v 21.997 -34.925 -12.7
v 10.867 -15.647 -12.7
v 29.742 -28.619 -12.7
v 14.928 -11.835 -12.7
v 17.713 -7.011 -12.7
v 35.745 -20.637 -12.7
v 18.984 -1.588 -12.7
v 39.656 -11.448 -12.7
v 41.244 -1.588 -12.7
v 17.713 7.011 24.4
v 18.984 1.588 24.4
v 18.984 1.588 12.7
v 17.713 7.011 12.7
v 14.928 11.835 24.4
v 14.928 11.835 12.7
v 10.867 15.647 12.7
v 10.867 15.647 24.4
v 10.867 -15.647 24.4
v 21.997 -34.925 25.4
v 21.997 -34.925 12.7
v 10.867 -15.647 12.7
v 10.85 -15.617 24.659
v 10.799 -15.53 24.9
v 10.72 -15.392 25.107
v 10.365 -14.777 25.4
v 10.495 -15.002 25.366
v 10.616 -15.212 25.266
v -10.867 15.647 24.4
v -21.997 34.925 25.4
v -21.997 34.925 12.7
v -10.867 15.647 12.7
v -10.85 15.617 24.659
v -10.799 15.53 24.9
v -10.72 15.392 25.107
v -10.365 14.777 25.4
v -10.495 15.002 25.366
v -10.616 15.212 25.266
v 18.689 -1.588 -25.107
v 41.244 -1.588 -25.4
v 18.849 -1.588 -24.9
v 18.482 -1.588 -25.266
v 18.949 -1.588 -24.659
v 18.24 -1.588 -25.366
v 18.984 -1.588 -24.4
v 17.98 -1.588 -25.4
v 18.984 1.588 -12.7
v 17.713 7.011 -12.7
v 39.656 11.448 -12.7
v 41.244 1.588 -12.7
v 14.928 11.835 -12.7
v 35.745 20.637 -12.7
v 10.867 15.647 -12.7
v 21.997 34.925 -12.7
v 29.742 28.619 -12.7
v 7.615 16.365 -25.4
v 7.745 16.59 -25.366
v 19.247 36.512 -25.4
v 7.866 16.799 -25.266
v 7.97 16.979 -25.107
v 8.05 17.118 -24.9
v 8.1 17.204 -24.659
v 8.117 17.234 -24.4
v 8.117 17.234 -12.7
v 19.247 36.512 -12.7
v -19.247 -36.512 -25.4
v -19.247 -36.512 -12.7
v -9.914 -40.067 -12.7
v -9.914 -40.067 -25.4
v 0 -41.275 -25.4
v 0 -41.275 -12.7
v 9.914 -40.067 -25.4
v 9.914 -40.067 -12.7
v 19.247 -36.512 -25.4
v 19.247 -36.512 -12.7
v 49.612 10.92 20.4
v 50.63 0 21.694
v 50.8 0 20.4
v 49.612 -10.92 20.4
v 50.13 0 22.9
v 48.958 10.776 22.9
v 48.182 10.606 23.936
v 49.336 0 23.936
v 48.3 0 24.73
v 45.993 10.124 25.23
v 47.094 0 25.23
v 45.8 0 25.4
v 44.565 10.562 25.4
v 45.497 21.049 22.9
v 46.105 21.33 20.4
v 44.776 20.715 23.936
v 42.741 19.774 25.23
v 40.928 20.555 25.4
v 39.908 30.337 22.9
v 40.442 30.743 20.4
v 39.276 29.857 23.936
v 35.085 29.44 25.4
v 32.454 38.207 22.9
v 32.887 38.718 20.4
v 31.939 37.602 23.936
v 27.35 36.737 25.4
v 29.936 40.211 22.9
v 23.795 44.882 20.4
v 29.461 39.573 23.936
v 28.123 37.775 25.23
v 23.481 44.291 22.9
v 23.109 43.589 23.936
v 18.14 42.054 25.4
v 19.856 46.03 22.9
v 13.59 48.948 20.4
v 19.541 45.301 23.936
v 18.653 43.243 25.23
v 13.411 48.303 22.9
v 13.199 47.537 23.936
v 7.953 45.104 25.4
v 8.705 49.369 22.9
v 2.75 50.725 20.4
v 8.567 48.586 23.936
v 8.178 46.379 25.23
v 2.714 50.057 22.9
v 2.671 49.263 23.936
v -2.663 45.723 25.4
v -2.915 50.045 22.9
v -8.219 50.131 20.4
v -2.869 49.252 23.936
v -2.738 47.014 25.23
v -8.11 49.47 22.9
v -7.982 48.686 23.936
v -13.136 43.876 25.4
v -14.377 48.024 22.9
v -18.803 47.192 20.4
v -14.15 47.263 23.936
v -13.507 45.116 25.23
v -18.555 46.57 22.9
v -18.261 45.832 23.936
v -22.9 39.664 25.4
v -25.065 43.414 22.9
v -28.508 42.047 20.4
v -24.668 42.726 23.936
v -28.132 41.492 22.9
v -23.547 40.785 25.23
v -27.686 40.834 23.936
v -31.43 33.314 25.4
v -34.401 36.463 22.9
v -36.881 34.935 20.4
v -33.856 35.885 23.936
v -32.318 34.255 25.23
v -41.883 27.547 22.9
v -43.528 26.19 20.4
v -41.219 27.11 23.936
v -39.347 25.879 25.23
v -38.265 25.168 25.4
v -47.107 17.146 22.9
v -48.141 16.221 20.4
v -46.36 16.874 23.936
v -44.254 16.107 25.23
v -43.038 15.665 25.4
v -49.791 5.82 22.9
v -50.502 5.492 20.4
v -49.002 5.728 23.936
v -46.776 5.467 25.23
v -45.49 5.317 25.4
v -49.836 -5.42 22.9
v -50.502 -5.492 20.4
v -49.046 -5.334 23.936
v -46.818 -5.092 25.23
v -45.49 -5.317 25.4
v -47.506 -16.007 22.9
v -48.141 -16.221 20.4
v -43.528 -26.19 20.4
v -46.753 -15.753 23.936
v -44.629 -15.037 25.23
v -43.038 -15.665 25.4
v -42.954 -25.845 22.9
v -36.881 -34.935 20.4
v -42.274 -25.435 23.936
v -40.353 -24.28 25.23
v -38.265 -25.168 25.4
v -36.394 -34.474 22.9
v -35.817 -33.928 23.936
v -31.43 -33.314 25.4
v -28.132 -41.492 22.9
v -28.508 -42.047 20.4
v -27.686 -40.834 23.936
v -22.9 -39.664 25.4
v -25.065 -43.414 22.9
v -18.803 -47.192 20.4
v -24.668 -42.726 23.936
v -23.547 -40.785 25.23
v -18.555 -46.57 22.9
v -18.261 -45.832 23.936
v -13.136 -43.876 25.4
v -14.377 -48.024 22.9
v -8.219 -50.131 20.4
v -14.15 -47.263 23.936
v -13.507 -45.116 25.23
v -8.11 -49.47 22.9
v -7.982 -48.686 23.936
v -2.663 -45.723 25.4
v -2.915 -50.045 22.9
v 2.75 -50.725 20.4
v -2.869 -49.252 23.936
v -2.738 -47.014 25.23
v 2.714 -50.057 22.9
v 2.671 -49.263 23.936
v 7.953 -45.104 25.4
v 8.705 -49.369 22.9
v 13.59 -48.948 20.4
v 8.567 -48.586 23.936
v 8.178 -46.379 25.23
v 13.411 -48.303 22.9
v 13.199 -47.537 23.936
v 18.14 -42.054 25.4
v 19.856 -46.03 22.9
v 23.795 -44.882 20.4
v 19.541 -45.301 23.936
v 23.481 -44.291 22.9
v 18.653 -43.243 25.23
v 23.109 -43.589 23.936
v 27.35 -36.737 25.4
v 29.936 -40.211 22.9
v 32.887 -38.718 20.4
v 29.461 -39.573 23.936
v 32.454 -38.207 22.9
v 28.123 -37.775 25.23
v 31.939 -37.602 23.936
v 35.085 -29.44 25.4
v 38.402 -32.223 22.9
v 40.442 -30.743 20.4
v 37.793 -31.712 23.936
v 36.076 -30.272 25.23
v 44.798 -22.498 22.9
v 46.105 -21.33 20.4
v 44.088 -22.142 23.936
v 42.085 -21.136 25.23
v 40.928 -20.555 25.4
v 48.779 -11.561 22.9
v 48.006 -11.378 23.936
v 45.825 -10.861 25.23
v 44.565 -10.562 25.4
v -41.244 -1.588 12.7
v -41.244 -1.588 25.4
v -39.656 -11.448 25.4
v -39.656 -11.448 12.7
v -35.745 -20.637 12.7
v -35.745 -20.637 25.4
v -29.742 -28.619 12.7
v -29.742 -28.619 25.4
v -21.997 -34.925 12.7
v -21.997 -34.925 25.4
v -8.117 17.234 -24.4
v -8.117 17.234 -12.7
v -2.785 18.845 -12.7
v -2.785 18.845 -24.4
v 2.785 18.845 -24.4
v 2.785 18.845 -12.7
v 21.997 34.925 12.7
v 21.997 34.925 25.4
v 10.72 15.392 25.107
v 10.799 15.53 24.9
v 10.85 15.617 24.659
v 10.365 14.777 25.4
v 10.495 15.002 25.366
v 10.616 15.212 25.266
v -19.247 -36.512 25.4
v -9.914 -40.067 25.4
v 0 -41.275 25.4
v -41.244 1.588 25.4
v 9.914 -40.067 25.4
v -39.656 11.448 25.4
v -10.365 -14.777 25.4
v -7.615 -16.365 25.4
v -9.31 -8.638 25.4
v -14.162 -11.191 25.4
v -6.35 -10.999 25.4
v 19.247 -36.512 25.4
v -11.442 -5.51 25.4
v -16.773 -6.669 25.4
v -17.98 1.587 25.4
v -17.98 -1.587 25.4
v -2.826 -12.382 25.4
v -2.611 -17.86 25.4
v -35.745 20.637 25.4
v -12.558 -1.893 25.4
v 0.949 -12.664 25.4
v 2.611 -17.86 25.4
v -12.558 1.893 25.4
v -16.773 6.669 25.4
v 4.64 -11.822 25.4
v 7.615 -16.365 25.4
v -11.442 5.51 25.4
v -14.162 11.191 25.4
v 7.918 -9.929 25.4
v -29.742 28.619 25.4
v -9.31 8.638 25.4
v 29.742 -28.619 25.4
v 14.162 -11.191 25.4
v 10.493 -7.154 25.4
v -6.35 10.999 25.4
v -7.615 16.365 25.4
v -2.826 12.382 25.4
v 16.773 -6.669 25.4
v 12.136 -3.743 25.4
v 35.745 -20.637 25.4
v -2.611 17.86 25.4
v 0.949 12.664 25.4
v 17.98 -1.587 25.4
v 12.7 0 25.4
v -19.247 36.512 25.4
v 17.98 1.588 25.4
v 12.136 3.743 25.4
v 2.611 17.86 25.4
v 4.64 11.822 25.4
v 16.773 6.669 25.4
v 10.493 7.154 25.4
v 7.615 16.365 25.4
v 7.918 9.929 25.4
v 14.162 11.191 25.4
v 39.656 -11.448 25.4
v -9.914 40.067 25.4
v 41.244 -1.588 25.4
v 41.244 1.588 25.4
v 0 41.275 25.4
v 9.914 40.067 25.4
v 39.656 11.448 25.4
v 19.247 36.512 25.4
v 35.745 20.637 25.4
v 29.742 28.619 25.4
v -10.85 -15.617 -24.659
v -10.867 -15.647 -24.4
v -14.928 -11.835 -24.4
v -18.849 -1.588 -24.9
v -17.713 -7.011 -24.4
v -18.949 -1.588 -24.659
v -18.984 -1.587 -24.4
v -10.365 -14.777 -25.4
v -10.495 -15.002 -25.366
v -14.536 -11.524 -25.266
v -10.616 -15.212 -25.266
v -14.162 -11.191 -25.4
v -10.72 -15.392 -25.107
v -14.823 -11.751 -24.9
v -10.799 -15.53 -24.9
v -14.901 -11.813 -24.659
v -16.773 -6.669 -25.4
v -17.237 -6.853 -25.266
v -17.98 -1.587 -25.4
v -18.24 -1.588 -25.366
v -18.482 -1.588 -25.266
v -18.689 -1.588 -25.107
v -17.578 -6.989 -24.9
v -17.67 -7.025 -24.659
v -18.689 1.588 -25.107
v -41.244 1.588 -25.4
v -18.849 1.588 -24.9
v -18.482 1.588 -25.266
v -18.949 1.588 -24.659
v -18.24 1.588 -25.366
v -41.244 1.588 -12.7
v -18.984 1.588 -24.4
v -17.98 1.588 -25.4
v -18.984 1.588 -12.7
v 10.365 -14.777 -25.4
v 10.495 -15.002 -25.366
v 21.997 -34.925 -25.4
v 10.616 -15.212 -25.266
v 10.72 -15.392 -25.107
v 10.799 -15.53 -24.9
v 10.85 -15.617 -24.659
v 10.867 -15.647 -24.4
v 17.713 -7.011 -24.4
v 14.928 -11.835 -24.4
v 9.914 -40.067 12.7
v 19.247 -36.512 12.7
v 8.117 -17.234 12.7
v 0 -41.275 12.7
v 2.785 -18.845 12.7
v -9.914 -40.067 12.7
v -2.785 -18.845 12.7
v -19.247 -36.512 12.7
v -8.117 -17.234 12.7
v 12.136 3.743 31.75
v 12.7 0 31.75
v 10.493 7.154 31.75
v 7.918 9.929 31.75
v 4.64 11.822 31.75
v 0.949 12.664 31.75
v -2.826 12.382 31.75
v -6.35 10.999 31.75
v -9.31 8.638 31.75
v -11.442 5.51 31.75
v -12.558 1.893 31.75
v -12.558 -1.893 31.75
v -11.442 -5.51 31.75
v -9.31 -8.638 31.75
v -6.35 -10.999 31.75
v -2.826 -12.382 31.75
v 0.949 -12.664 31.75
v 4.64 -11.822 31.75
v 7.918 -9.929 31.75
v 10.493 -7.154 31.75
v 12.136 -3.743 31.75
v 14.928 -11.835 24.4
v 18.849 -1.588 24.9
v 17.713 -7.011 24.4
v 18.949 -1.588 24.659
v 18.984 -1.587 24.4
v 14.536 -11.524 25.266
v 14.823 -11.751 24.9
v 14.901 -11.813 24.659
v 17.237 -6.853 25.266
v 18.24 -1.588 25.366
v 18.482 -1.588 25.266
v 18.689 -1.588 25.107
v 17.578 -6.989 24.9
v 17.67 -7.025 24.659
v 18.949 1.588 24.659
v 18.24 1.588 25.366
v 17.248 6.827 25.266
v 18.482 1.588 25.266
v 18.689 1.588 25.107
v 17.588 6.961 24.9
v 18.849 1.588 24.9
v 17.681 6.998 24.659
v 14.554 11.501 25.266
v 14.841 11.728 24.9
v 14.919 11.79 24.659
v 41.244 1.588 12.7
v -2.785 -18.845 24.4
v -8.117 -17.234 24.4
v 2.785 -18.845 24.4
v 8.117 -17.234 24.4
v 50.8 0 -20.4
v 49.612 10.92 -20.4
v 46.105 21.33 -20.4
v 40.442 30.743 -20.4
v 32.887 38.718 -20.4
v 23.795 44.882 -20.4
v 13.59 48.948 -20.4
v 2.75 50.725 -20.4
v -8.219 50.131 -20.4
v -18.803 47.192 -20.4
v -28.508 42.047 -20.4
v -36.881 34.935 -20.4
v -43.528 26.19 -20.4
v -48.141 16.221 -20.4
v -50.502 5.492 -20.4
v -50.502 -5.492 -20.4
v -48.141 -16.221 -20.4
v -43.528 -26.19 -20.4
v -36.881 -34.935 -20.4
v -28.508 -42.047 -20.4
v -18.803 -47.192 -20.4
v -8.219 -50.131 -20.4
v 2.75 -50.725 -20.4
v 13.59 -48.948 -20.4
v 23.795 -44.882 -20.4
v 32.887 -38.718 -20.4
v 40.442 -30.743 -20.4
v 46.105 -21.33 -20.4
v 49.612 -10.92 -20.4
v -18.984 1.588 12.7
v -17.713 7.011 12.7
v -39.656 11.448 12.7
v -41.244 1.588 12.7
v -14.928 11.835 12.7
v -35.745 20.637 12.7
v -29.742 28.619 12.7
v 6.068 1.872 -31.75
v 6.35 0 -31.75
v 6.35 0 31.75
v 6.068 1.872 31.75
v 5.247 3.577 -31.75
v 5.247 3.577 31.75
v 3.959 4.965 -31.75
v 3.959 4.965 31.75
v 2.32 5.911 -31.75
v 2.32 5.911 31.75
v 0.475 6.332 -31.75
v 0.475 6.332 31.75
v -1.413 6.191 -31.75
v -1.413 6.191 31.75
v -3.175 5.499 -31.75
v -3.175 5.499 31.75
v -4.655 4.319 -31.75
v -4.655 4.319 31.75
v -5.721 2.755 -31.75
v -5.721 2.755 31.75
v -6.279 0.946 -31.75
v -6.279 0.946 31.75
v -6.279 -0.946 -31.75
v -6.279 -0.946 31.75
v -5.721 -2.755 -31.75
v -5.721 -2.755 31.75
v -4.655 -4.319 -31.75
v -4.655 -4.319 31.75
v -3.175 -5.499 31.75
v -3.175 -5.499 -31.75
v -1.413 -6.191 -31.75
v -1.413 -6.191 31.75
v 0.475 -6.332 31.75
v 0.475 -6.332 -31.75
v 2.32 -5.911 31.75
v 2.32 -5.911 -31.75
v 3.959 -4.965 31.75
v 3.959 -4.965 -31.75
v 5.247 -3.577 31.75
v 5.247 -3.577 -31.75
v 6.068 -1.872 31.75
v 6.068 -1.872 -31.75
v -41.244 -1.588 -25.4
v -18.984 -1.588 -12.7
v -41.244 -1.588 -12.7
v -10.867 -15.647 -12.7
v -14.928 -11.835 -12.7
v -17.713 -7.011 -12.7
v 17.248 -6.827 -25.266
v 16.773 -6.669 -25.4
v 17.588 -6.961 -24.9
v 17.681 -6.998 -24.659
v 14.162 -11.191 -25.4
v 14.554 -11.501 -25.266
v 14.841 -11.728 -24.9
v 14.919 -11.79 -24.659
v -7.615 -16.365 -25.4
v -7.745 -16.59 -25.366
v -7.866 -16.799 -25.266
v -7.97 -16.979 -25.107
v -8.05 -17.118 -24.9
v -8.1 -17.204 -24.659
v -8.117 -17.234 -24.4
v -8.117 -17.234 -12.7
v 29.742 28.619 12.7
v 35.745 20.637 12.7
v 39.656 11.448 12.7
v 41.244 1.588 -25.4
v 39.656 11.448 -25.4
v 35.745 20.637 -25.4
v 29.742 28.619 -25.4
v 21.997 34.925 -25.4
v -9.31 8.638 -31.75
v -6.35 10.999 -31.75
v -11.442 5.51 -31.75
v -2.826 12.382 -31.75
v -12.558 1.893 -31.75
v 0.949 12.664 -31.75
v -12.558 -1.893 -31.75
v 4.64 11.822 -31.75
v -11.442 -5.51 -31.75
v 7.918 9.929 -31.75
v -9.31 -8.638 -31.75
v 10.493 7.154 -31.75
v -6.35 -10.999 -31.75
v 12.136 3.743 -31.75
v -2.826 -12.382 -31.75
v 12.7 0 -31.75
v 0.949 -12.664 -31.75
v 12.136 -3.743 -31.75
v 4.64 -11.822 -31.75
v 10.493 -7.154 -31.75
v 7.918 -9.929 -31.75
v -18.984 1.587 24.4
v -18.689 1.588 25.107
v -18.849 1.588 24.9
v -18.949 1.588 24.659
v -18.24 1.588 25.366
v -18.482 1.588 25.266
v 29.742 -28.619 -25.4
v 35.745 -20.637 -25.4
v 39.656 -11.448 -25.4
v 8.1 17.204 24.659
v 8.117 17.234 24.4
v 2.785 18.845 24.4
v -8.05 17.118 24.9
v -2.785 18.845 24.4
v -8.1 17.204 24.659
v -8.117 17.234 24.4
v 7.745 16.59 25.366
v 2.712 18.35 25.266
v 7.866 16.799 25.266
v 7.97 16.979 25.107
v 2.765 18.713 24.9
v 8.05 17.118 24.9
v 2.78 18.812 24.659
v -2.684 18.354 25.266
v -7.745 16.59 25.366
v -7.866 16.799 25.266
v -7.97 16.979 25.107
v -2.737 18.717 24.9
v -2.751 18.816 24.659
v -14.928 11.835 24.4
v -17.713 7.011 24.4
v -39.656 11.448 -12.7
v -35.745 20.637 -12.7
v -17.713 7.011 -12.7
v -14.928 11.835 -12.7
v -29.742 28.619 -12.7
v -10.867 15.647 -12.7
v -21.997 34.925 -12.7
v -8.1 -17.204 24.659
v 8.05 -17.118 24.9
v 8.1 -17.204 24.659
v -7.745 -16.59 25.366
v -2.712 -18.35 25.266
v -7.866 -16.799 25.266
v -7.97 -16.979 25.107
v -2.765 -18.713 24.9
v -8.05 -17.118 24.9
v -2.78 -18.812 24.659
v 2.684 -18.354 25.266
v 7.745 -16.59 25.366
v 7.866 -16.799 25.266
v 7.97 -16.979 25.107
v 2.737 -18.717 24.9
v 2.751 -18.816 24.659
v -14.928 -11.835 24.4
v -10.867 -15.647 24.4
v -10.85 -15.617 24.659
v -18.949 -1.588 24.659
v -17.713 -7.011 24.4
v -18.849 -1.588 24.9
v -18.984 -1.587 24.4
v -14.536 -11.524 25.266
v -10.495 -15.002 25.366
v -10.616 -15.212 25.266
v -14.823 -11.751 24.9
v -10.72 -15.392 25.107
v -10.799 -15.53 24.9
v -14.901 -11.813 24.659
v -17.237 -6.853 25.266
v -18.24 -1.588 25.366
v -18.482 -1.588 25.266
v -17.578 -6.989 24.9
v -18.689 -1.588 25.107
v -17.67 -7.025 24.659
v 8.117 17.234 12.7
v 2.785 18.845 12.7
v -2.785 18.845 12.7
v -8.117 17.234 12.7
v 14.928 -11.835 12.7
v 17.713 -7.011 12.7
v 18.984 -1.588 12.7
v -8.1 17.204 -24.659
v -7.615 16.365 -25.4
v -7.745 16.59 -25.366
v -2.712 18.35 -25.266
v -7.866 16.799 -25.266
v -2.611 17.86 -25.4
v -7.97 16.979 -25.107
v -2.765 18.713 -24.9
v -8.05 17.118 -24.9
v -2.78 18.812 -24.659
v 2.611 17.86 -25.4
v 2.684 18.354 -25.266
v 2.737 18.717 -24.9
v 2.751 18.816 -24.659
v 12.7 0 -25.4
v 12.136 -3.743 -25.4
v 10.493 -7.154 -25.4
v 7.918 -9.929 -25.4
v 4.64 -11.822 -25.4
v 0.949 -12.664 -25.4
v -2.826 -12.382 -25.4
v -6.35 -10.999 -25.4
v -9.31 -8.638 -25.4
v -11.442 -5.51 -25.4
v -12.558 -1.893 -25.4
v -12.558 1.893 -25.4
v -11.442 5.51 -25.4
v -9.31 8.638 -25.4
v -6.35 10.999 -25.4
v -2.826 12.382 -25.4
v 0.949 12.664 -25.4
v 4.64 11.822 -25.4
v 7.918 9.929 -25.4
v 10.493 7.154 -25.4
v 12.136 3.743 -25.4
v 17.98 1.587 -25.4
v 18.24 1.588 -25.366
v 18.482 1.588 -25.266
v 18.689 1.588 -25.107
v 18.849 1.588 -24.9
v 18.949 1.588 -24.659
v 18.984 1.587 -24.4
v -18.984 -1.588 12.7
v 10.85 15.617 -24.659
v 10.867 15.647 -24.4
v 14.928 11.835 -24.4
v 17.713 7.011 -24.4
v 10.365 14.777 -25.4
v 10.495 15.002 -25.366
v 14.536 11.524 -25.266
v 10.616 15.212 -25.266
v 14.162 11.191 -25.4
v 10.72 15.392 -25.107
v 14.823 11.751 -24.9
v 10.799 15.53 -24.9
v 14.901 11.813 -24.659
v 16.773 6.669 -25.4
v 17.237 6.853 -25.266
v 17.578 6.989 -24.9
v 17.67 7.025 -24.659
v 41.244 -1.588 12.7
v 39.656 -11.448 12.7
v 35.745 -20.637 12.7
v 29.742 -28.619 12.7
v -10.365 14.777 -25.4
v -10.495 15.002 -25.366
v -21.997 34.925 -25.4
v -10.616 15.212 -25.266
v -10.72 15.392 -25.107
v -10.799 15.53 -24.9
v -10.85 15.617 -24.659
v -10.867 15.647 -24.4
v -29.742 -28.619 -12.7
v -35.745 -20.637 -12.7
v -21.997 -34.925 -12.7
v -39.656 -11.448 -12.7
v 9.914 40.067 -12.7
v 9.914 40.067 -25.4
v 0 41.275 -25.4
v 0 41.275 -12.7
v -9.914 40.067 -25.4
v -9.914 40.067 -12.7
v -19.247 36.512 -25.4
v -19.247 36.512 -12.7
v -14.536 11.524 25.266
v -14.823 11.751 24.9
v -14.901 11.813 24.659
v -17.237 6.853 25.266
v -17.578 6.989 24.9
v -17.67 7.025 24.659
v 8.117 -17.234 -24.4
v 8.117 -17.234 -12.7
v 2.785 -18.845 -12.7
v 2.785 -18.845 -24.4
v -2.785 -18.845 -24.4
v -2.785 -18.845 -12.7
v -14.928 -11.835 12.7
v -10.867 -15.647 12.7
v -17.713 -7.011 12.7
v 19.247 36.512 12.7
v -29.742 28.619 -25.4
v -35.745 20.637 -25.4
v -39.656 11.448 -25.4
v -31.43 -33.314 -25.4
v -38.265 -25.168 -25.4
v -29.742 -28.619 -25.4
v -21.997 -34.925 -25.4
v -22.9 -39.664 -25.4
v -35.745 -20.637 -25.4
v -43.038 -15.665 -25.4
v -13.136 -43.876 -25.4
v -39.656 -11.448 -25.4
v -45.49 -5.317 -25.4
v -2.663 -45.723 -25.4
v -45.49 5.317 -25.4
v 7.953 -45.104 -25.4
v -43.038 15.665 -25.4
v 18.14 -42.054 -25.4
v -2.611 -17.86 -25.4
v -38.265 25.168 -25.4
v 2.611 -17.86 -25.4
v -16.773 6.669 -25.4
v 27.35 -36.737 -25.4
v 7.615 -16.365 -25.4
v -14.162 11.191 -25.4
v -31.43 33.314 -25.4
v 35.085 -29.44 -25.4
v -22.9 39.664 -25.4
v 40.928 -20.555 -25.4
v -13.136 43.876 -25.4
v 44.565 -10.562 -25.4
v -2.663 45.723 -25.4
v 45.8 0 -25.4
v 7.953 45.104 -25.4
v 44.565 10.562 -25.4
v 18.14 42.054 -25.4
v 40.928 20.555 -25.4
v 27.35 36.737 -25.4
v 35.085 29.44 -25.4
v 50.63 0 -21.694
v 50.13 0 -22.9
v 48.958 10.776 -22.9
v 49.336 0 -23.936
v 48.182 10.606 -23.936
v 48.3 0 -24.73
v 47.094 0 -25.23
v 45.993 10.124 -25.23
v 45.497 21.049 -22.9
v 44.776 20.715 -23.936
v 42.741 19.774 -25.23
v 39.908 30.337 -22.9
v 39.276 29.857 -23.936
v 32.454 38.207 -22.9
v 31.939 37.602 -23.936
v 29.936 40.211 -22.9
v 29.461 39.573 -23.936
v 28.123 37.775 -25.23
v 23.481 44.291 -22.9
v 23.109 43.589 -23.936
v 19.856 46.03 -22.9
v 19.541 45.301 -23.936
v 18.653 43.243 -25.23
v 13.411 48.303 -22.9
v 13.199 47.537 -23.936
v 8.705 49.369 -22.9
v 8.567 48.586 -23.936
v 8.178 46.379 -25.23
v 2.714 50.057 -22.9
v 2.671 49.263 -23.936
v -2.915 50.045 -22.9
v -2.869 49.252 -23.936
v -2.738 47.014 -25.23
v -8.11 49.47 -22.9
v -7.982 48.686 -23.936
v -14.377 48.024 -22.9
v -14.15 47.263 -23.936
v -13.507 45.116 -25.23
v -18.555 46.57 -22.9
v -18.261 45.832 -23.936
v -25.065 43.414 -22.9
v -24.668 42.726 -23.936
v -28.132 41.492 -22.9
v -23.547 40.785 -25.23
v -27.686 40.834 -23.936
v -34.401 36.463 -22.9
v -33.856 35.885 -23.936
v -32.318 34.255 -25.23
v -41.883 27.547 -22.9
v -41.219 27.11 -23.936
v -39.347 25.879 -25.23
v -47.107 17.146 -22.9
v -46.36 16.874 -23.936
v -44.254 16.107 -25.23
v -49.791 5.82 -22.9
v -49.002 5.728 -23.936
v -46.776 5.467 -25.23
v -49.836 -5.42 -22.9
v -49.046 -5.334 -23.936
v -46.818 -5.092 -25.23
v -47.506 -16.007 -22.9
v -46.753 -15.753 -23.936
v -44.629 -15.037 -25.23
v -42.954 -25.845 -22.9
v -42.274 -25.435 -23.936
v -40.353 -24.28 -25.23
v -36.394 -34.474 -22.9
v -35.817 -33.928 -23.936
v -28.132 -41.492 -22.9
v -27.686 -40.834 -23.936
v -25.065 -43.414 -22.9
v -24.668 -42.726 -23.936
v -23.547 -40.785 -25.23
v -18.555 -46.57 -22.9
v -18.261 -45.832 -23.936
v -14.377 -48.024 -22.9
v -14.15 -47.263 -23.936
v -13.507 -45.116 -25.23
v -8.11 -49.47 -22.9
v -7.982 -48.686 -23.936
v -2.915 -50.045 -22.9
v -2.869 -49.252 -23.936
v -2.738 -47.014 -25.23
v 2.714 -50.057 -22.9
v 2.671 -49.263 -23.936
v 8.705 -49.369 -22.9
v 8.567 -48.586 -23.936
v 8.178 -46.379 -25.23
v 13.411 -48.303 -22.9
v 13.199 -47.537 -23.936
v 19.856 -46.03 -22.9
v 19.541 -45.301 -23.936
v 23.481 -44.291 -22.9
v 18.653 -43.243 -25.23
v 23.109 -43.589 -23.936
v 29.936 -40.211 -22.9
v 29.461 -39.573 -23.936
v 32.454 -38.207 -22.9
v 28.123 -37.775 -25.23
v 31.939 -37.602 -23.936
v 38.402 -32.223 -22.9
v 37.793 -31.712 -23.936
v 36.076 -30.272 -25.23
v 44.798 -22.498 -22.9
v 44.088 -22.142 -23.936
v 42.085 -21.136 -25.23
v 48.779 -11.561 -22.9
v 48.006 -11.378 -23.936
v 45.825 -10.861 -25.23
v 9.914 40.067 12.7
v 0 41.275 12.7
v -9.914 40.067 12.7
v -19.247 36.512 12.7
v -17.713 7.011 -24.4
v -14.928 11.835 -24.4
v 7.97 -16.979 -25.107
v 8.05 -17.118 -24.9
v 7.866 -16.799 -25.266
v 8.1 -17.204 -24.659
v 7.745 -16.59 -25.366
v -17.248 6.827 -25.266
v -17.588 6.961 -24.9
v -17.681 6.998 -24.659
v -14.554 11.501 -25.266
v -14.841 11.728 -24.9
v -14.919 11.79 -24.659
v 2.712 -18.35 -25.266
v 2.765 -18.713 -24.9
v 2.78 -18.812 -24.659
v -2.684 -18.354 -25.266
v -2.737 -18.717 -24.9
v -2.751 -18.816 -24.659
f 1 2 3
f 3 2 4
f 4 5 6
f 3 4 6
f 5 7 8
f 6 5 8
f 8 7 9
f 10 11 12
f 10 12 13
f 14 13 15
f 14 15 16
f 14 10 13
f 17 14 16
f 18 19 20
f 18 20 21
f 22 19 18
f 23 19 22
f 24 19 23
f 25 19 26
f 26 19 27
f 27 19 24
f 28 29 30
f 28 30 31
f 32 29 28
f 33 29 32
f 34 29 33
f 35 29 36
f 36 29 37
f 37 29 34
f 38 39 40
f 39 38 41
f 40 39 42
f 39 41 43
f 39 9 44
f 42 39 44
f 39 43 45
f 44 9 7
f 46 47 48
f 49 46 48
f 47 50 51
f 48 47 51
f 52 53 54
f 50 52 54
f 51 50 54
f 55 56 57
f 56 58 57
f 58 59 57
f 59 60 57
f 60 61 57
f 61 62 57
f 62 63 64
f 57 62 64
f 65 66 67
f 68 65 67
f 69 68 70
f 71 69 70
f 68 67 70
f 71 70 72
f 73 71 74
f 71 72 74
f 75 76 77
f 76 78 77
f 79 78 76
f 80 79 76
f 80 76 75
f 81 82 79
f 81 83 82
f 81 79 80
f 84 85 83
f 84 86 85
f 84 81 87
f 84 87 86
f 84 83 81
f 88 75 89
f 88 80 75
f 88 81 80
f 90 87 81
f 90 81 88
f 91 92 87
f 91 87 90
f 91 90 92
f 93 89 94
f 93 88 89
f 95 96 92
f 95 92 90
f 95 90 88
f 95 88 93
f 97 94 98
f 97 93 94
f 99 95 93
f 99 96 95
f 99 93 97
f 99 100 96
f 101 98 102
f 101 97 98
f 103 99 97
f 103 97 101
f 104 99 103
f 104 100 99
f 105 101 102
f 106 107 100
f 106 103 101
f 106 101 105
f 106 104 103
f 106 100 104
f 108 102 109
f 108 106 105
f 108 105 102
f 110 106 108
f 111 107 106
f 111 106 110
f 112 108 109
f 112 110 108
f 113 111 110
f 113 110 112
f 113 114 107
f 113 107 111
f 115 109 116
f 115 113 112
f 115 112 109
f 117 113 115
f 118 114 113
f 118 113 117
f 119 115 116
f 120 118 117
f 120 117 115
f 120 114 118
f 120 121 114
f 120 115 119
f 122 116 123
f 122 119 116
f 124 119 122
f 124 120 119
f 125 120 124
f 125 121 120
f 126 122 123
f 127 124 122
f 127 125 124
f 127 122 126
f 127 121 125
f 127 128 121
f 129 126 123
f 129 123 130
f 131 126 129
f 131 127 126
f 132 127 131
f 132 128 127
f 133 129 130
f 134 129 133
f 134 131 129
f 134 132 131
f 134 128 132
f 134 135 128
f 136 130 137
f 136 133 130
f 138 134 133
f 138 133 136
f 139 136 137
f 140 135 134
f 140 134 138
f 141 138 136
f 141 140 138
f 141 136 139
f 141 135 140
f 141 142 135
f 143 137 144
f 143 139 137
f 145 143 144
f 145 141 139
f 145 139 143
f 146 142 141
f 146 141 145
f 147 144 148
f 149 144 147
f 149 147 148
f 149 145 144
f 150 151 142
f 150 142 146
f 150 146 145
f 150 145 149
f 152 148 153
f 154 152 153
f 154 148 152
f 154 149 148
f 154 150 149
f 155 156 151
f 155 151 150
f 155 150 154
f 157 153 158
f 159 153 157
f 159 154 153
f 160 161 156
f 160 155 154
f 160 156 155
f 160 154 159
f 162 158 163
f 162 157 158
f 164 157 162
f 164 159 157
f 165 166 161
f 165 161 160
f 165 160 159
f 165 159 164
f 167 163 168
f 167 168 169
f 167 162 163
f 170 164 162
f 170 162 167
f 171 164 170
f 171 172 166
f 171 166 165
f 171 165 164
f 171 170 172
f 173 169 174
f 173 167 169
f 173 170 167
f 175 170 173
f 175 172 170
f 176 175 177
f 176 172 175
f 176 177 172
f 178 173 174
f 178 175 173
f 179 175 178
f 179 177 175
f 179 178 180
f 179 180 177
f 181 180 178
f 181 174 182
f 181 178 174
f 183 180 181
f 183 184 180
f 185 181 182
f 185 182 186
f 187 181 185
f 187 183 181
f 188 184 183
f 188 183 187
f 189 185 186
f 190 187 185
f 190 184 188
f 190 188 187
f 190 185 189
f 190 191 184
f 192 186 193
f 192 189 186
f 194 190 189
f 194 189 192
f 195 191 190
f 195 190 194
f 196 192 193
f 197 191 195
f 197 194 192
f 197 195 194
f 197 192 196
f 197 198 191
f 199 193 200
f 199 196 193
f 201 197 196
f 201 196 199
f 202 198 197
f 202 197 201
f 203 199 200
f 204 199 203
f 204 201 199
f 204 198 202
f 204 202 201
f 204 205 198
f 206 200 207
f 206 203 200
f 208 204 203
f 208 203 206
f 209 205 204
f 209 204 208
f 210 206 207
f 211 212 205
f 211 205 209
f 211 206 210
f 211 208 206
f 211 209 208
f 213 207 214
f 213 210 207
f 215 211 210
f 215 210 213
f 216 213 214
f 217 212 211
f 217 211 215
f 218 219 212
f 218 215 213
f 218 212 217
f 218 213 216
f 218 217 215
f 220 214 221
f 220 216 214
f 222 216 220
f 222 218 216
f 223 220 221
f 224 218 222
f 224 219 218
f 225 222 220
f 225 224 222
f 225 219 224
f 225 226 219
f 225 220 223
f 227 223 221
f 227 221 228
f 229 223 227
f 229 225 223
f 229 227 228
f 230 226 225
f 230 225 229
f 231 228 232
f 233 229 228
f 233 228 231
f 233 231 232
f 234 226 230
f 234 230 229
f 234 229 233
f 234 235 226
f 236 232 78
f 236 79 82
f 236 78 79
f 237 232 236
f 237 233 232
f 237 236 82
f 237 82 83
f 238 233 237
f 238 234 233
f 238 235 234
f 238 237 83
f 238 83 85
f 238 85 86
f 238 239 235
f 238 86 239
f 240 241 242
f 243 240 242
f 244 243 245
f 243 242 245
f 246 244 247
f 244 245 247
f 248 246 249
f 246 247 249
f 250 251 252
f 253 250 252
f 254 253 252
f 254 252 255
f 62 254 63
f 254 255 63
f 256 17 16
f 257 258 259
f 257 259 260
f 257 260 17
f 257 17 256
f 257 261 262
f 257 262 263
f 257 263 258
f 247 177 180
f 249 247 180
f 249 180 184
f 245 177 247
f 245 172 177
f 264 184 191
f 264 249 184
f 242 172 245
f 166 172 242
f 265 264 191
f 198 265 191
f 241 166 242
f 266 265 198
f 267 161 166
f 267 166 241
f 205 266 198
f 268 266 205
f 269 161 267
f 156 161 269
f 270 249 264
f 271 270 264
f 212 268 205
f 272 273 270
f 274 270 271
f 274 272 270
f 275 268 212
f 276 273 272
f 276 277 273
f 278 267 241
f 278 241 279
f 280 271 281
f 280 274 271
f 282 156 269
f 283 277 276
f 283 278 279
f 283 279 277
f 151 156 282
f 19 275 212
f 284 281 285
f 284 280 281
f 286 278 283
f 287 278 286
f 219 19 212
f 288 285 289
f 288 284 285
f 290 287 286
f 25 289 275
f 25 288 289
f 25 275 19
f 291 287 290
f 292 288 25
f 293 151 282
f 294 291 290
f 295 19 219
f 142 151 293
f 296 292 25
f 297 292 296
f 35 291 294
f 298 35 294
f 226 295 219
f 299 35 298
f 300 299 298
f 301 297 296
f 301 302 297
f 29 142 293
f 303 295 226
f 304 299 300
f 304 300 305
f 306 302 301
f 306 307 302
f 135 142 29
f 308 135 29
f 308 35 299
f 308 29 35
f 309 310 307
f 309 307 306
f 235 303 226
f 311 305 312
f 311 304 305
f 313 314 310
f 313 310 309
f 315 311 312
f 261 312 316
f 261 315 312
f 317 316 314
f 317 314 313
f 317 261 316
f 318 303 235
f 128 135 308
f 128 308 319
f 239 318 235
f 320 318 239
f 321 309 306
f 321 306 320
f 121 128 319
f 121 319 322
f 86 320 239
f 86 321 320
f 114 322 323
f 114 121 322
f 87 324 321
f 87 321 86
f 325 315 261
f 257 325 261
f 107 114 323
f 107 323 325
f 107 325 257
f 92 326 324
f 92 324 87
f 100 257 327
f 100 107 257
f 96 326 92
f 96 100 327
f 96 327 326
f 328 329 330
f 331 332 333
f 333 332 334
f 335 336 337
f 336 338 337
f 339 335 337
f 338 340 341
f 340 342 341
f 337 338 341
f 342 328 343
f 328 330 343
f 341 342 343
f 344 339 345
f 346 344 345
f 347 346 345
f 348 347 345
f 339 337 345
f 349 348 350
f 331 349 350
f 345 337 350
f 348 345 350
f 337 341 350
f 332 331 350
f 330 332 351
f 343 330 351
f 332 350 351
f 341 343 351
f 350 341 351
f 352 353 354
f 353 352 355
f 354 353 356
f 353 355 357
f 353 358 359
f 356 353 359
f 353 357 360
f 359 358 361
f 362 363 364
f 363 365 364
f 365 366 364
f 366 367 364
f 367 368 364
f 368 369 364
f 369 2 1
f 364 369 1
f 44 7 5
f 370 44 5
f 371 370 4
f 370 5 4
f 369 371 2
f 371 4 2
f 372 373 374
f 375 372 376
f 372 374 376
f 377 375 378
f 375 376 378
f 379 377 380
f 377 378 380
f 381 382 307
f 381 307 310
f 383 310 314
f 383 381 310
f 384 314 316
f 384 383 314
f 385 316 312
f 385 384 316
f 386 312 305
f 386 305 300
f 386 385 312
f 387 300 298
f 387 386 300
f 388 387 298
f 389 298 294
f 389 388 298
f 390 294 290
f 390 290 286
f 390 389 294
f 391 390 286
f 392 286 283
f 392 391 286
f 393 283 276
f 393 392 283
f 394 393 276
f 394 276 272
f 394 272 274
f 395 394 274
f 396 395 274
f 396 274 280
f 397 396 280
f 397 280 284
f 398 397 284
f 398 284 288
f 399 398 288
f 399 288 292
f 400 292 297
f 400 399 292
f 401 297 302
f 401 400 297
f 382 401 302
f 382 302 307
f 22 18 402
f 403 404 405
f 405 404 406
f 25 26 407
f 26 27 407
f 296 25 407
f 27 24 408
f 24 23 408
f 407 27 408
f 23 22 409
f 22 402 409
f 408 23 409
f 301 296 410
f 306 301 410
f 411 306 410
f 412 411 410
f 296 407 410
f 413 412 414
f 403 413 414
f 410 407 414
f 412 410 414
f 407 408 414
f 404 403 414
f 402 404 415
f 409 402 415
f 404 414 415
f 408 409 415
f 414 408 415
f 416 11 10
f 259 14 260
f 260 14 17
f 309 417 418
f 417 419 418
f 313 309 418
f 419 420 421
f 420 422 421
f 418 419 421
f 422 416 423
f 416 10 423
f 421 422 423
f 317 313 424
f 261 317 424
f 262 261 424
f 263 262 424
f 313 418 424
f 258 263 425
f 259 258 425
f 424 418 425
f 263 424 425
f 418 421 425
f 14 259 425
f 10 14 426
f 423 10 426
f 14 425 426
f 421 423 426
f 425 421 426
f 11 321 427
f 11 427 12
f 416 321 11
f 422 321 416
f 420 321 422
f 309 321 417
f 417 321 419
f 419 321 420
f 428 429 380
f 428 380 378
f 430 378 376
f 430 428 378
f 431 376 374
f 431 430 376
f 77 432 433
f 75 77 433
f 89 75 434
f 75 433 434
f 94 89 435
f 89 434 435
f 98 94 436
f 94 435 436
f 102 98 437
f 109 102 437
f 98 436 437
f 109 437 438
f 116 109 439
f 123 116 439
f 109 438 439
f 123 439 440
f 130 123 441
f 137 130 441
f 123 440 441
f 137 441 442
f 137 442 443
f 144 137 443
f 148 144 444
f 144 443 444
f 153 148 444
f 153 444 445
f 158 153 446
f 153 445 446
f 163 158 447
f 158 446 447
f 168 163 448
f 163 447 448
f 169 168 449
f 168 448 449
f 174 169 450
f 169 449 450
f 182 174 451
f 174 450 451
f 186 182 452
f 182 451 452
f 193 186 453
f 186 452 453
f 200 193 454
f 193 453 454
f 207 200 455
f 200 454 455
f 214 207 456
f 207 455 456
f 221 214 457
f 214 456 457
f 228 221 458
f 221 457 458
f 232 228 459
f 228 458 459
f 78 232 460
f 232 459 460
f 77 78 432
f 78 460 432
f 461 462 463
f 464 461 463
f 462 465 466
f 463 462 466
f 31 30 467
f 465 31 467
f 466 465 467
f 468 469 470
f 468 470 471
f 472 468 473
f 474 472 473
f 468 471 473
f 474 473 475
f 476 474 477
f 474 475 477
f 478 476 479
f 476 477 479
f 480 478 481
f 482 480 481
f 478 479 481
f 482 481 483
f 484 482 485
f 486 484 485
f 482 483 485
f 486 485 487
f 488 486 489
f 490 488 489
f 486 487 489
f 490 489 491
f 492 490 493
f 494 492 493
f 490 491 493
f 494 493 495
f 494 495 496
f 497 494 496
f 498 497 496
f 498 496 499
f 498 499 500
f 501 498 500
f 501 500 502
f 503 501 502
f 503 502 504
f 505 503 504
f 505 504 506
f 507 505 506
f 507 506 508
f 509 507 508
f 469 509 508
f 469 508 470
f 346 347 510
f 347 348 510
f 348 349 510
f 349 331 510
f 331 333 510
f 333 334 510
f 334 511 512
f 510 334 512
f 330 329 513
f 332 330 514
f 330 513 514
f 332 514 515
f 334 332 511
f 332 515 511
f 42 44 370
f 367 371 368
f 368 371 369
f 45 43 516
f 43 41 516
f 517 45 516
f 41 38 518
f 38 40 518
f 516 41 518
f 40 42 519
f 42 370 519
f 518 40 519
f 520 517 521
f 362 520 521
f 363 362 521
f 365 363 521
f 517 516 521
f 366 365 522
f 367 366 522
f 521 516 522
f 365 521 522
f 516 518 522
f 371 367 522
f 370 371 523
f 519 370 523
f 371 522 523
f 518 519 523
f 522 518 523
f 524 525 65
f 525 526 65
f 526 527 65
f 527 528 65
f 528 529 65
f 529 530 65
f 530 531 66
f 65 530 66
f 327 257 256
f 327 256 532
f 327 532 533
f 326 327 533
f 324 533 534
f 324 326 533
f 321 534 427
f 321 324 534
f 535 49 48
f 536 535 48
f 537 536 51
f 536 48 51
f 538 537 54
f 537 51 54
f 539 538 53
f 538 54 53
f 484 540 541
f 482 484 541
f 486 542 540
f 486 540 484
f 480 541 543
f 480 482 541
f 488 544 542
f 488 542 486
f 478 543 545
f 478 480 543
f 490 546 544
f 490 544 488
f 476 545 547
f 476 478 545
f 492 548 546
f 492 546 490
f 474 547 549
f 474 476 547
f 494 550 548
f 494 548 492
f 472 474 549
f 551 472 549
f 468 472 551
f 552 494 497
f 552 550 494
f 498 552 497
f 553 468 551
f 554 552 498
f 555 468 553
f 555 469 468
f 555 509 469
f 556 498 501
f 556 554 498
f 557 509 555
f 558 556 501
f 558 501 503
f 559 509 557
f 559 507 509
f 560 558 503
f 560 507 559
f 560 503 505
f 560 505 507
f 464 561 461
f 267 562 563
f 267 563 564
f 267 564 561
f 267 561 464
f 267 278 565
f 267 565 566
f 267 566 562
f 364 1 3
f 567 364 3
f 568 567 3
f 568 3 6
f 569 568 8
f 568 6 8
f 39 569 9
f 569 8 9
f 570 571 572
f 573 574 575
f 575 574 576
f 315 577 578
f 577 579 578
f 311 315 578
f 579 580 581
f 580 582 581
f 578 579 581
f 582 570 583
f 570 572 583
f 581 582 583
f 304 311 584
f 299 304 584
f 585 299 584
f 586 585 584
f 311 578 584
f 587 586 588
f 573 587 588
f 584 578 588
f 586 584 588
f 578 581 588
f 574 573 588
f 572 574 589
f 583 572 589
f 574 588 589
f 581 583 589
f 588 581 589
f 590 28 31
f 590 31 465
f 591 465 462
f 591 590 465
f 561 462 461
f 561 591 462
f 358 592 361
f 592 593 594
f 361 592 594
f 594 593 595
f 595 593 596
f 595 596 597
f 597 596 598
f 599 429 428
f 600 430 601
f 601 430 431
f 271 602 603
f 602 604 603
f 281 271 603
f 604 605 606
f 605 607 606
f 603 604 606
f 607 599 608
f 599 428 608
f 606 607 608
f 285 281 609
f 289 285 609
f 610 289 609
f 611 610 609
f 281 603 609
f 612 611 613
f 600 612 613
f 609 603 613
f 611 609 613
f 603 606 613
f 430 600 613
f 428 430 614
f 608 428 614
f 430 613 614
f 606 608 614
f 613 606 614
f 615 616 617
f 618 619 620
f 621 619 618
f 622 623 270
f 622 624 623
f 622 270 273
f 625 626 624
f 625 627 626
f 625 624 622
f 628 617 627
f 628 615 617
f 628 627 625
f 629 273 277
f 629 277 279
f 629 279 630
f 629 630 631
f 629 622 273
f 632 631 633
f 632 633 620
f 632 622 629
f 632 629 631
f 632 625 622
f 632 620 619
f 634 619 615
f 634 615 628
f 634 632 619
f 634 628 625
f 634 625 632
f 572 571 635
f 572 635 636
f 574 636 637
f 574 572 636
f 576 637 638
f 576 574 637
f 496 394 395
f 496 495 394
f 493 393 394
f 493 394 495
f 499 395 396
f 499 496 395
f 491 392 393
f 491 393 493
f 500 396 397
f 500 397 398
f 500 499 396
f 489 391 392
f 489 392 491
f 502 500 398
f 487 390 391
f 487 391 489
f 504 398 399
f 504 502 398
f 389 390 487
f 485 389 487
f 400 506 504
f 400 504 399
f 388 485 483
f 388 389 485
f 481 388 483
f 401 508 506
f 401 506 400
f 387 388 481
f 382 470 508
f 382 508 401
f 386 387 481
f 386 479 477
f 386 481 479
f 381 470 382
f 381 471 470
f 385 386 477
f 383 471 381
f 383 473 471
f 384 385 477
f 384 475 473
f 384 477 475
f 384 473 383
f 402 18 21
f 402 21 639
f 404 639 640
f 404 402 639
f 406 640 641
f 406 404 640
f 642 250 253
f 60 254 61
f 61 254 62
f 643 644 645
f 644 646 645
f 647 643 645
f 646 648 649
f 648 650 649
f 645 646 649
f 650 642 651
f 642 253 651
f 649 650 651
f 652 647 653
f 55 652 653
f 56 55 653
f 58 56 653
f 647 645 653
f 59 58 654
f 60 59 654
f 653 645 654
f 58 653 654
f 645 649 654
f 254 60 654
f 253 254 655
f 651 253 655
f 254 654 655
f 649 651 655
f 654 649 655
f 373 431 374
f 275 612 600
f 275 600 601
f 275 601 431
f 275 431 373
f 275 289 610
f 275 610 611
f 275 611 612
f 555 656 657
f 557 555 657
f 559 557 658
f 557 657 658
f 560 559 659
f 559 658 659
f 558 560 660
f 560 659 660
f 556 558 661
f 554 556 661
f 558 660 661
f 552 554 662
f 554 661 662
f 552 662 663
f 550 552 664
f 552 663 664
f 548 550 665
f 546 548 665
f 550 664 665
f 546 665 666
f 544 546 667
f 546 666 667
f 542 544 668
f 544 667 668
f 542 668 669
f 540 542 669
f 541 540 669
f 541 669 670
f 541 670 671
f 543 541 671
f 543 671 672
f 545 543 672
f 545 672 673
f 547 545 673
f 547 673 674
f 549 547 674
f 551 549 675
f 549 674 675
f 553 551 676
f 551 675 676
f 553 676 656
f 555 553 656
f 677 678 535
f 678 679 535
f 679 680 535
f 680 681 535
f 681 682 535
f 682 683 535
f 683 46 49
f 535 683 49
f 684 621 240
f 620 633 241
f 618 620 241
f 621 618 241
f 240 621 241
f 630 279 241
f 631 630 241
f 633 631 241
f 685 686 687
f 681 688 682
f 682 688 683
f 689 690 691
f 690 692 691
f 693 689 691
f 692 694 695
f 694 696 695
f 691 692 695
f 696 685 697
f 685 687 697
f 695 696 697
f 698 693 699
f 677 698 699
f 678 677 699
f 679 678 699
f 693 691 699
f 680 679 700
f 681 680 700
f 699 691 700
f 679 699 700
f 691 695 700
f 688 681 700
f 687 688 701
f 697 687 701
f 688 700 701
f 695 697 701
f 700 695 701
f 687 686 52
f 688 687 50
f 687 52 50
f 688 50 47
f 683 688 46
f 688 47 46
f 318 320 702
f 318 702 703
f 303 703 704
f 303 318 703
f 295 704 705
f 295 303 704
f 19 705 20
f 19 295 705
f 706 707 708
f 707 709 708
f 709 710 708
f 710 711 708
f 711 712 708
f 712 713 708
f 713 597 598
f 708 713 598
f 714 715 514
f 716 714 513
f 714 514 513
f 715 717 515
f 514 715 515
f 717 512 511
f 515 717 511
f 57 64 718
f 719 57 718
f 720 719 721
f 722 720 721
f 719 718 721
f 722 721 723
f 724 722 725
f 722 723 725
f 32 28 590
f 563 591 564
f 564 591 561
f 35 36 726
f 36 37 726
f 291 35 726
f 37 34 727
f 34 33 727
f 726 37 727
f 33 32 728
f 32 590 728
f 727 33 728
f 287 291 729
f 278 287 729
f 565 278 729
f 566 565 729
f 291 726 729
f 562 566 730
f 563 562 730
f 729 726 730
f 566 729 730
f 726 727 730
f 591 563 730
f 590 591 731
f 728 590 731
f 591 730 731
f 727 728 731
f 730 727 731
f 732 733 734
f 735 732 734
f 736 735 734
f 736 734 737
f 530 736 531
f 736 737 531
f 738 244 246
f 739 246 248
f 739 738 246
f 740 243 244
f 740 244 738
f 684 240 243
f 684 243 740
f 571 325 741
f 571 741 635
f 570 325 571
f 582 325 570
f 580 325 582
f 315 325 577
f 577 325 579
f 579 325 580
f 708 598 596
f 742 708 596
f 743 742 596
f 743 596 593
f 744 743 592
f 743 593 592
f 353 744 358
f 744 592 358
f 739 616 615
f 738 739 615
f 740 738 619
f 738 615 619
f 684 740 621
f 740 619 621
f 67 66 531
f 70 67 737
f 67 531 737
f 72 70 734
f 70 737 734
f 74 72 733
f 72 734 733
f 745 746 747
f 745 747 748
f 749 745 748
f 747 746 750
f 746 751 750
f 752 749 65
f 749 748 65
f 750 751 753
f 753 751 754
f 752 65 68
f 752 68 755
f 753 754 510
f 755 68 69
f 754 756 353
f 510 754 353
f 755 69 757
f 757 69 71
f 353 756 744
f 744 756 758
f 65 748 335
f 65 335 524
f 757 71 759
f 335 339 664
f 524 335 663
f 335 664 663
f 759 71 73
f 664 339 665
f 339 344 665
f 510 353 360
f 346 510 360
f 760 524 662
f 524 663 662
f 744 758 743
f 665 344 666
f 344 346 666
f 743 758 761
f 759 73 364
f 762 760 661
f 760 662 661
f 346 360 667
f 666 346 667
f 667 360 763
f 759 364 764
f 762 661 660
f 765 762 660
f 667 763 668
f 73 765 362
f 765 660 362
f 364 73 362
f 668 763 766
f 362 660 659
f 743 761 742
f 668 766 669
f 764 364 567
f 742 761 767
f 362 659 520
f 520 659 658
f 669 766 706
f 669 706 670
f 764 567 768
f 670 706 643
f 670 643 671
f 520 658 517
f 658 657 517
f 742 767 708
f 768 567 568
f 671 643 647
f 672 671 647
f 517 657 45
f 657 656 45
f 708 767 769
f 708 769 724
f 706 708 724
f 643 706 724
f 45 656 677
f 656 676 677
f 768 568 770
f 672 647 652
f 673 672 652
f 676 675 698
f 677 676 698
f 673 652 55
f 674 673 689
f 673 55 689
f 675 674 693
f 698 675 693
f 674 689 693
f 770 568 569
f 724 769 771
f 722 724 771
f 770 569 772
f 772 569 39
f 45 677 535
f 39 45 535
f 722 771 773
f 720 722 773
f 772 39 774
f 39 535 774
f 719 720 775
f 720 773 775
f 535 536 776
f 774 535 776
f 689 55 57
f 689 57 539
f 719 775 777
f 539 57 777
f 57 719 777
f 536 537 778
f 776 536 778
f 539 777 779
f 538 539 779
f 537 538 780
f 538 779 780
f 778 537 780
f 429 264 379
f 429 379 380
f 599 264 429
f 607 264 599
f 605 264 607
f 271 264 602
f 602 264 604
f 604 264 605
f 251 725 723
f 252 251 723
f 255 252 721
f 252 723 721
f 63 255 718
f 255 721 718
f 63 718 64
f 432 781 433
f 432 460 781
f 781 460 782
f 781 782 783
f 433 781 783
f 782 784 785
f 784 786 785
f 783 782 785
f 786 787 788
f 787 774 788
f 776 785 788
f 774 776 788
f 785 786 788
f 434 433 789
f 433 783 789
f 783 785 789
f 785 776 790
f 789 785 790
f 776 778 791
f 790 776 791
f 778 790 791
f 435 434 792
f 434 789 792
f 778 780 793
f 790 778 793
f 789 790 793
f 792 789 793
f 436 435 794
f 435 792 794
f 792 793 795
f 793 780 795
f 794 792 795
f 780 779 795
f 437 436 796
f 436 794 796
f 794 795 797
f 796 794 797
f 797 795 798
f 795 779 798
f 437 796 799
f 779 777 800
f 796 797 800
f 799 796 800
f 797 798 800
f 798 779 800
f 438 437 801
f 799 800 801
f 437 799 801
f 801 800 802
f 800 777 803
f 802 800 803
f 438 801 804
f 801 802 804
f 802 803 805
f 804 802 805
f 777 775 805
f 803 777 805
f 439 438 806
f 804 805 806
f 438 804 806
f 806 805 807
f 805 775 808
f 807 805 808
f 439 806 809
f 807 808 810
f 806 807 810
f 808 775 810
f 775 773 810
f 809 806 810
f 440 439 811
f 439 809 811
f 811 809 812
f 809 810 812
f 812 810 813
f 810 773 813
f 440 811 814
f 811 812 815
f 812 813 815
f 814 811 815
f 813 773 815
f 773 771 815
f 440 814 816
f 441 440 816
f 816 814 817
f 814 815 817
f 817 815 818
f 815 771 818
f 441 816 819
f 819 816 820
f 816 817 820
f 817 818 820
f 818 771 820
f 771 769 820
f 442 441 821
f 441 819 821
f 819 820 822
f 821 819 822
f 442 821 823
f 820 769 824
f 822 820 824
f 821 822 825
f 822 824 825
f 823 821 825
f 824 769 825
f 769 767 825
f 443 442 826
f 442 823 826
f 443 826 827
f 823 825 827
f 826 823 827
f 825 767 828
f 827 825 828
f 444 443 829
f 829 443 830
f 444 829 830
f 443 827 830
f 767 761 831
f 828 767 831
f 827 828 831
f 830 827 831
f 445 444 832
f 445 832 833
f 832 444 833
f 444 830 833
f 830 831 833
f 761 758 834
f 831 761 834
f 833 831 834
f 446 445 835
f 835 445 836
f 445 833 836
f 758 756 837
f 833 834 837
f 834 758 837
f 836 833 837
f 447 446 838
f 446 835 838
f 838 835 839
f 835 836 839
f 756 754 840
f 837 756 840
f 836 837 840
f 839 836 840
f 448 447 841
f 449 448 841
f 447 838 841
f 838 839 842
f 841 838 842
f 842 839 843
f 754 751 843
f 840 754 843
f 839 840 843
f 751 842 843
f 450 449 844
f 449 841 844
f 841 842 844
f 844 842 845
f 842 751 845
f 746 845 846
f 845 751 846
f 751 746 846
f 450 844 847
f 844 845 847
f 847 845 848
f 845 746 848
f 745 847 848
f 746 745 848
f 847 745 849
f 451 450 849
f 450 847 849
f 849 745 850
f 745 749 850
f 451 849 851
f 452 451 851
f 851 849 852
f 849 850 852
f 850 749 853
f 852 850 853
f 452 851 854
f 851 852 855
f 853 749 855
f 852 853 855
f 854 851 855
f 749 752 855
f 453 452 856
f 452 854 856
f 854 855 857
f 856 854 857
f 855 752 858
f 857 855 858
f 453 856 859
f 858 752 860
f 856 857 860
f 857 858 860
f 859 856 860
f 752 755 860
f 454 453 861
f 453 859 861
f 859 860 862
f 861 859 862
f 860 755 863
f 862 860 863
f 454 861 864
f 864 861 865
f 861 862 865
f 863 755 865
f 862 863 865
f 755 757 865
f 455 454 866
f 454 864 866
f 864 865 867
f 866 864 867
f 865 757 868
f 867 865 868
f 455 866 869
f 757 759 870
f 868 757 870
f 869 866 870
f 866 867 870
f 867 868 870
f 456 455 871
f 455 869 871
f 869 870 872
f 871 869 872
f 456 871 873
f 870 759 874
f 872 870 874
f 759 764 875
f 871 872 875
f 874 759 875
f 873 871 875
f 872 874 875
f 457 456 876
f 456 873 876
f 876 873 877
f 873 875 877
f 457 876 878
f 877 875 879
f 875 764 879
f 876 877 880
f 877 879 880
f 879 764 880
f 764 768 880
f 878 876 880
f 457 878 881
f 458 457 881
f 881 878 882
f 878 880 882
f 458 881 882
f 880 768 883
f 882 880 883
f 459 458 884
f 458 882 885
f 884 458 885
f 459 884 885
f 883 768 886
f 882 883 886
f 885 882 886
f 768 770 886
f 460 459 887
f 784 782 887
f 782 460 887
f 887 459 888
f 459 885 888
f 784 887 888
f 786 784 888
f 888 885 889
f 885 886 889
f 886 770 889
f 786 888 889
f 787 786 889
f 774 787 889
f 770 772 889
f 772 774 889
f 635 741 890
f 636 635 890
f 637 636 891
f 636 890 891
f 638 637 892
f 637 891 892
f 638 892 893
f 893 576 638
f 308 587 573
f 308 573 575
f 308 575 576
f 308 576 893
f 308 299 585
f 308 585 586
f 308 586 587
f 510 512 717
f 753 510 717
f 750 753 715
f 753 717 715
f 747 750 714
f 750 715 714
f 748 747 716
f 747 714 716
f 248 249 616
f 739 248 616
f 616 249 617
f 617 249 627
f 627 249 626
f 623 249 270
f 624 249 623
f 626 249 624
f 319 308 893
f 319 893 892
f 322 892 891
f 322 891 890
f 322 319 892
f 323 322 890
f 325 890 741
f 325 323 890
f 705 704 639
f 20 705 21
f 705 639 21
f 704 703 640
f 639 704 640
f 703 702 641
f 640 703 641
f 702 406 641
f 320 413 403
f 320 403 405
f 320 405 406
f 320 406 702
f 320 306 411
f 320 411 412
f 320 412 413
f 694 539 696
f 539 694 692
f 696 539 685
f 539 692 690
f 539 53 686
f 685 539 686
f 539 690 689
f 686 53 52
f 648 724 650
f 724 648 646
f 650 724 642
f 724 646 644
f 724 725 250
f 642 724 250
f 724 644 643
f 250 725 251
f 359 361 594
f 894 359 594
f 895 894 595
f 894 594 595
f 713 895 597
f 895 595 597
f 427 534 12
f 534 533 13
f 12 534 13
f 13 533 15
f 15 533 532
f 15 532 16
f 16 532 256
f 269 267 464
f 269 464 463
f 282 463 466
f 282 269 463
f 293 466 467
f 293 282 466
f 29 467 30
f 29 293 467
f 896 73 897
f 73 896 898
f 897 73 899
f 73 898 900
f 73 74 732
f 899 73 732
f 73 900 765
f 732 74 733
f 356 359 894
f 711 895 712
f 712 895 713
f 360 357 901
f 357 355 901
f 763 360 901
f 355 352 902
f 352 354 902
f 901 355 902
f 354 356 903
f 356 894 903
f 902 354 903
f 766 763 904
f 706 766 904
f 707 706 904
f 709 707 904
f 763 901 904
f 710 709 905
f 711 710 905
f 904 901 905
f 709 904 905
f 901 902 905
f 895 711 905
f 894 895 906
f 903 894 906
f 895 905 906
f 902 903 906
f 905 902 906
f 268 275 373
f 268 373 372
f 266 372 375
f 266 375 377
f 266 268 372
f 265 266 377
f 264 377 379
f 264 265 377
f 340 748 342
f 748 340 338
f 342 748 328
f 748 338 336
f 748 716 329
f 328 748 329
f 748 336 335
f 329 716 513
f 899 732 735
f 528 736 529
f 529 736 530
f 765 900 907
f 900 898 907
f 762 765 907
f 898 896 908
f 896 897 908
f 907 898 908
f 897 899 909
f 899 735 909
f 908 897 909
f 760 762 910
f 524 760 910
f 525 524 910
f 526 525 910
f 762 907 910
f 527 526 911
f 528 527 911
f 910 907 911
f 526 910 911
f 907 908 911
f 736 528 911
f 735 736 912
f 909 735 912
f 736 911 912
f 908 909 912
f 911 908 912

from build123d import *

# Parameters (mm, degrees)
BOSS_EXTRUDE1_DEPTH      = 25.4
BOSS_EXTRUDE1_DEPTH_BACK = 25.4
SKETCH1_R                = 50.8
CUT_EXTRUDE1_DEPTH       = 12.7
CUT_EXTRUDE2_START       = -12.7
CUT_EXTRUDE2_DEPTH       = 12.7
SKETCH5_R                = 12.7
BOSS_EXTRUDE2_DEPTH      = 6.35
BOSS_EXTRUDE3_START      = 6.35
SKETCH6_R                = 12.7
BOSS_EXTRUDE3_DEPTH      = 6.35
SKETCH7_R                = 6.35
CUT_EXTRUDE3_DEPTH       = 96.882897328
FILLET1_R                = 5
FILLET2_R                = 1


with BuildPart() as part:
    # Sketch1 → Boss-Extrude1 (new, two sides: drawn at the far end of the back side and taken through both)
    with BuildSketch(Plane.XY.offset(-BOSS_EXTRUDE1_DEPTH_BACK)):
        Circle(SKETCH1_R)
    extrude(amount=BOSS_EXTRUDE1_DEPTH + BOSS_EXTRUDE1_DEPTH_BACK)

    # Sketch3 → Cut-Extrude1 (cut)
    with BuildSketch(Plane.XY.offset(25.4)):
        with BuildLine():
            Line((-19.247414599, -36.5125), (-8.117054136, -17.234150172))
            ThreePointArc((-8.117054136, -17.234150172), (0, -19.05), (8.117054136, -17.234150172))
            Line((8.117054136, -17.234150172), (19.247414599, -36.5125))
            ThreePointArc((19.247414599, -36.5125), (0, -41.275), (-19.247414599, -36.5125))
        make_face()
        with BuildLine():
            Line((-21.997045256, -34.925), (-10.866684793, -15.646650172))
            ThreePointArc((-10.866684793, -15.646650172), (-16.497783942, -9.525), (-18.98373893, -1.5875))
            Line((-18.98373893, -1.5875), (-41.244459855, -1.5875))
            ThreePointArc((-41.244459855, -1.5875), (-35.745198541, -20.6375), (-21.997045256, -34.925))
        make_face()
        with BuildLine():
            Line((21.997045256, -34.925), (10.866684793, -15.646650172))
            ThreePointArc((10.866684793, -15.646650172), (16.497783942, -9.525), (18.98373893, -1.5875))
            Line((18.98373893, -1.5875), (41.244459855, -1.5875))
            ThreePointArc((41.244459855, -1.5875), (35.745198541, -20.6375), (21.997045256, -34.925))
        make_face()
        with BuildLine():
            Line((-21.997045256, 34.925), (-10.866684793, 15.646650172))
            ThreePointArc((-10.866684793, 15.646650172), (-16.497783942, 9.525), (-18.98373893, 1.5875))
            Line((-18.98373893, 1.5875), (-41.244459855, 1.5875))
            ThreePointArc((-41.244459855, 1.5875), (-35.745198541, 20.6375), (-21.997045256, 34.925))
        make_face()
        with BuildLine():
            Line((41.244459855, 1.5875), (18.98373893, 1.5875))
            ThreePointArc((18.98373893, 1.5875), (16.497783942, 9.525), (10.866684793, 15.646650172))
            Line((10.866684793, 15.646650172), (21.997045256, 34.925))
            ThreePointArc((21.997045256, 34.925), (35.745198541, 20.6375), (41.244459855, 1.5875))
        make_face()
        with BuildLine():
            Line((-8.117054136, 17.234150172), (-19.247414599, 36.5125))
            ThreePointArc((-19.247414599, 36.5125), (0, 41.275), (19.247414599, 36.5125))
            Line((19.247414599, 36.5125), (8.117054136, 17.234150172))
            ThreePointArc((8.117054136, 17.234150172), (0, 19.05), (-8.117054136, 17.234150172))
        make_face()
    extrude(amount=-CUT_EXTRUDE1_DEPTH, mode=Mode.SUBTRACT)

    # Sketch4 → Cut-Extrude2 (cut)
    with BuildSketch(Plane(origin=(0, 0, -25.4), x_dir=(-1, 0, 0), z_dir=(0, 0, -1)).offset(CUT_EXTRUDE2_START)):
        with BuildLine():
            Line((21.997045256, -34.925), (10.866684793, -15.646650172))
            ThreePointArc((10.866684793, -15.646650172), (16.497783942, -9.525), (18.98373893, -1.5875))
            Line((18.98373893, -1.5875), (41.244459855, -1.5875))
            ThreePointArc((41.244459855, -1.5875), (35.745198541, -20.6375), (21.997045256, -34.925))
        make_face()
        with BuildLine():
            Line((8.117054136, -17.234150172), (19.247414599, -36.5125))
            ThreePointArc((19.247414599, -36.5125), (0, -41.275), (-19.247414599, -36.5125))
            Line((-19.247414599, -36.5125), (-8.117054136, -17.234150172))
            ThreePointArc((-8.117054136, -17.234150172), (0, -19.05), (8.117054136, -17.234150172))
        make_face()
        with BuildLine():
            Line((-10.866684793, -15.646650172), (-21.997045256, -34.925))
            ThreePointArc((-21.997045256, -34.925), (-35.745198541, -20.6375), (-41.244459855, -1.5875))
            Line((-41.244459855, -1.5875), (-18.98373893, -1.5875))
            ThreePointArc((-18.98373893, -1.5875), (-16.497783942, -9.525), (-10.866684793, -15.646650172))
        make_face()
        with BuildLine():
            Line((-21.997045256, 34.925), (-10.866684793, 15.646650172))
            ThreePointArc((-10.866684793, 15.646650172), (-16.497783942, 9.525), (-18.98373893, 1.5875))
            Line((-18.98373893, 1.5875), (-41.244459855, 1.5875))
            ThreePointArc((-41.244459855, 1.5875), (-35.745198541, 20.6375), (-21.997045256, 34.925))
        make_face()
        with BuildLine():
            Line((41.244459855, 1.5875), (18.98373893, 1.5875))
            ThreePointArc((18.98373893, 1.5875), (16.497783942, 9.525), (10.866684793, 15.646650172))
            Line((10.866684793, 15.646650172), (21.997045256, 34.925))
            ThreePointArc((21.997045256, 34.925), (35.745198541, 20.6375), (41.244459855, 1.5875))
        make_face()
        with BuildLine():
            Line((-8.117054136, 17.234150172), (-19.247414599, 36.5125))
            ThreePointArc((-19.247414599, 36.5125), (0, 41.275), (19.247414599, 36.5125))
            Line((19.247414599, 36.5125), (8.117054136, 17.234150172))
            ThreePointArc((8.117054136, 17.234150172), (0, 19.05), (-8.117054136, 17.234150172))
        make_face()
    extrude(amount=CUT_EXTRUDE2_DEPTH, mode=Mode.SUBTRACT)

    # Sketch5 → Boss-Extrude2 (add)
    with BuildSketch(Plane(origin=(0, 0, -25.4), x_dir=(-1, 0, 0), z_dir=(0, 0, -1))):
        Circle(SKETCH5_R)
    extrude(amount=BOSS_EXTRUDE2_DEPTH)

    # Sketch6 → Boss-Extrude3 (add)
    with BuildSketch(Plane.XY.offset(25.4).offset(BOSS_EXTRUDE3_START)):
        Circle(SKETCH6_R)
    extrude(amount=-BOSS_EXTRUDE3_DEPTH)

    # Sketch7 → Cut-Extrude3 (cut, through all)
    with BuildSketch(Plane.XY.offset(31.75)):
        Circle(SKETCH7_R)
    extrude(amount=-CUT_EXTRUDE3_DEPTH, mode=Mode.SUBTRACT)

    # Fillet1
    fillet1_edges = [part.edges().sort_by_distance(p)[0] for p in [
        (-50.8, 0, 25.4),
        (-50.8, 0, -25.4),
    ]]
    fillet(fillet1_edges, radius=FILLET1_R)

    # Fillet2
    fillet2_edges = [part.edges().sort_by_distance(p)[0] for p in [
        (16.497783942, 9.525, 25.4),
        (16.497783942, -9.525, 25.4),
        (0, -19.05, 25.4),
        (-16.497783942, -9.525, 25.4),
        (0, 19.05, 25.4),
        (-16.497783942, 9.525, 25.4),
        (-16.497783942, 9.525, -25.4),
        (-16.497783942, -9.525, -25.4),
        (0, -19.05, -25.4),
        (16.497783942, -9.525, -25.4),
        (16.497783942, 9.525, -25.4),
        (0, 19.05, -25.4),
    ]]
    fillet(fillet2_edges, radius=FILLET2_R)


solid = part.part
